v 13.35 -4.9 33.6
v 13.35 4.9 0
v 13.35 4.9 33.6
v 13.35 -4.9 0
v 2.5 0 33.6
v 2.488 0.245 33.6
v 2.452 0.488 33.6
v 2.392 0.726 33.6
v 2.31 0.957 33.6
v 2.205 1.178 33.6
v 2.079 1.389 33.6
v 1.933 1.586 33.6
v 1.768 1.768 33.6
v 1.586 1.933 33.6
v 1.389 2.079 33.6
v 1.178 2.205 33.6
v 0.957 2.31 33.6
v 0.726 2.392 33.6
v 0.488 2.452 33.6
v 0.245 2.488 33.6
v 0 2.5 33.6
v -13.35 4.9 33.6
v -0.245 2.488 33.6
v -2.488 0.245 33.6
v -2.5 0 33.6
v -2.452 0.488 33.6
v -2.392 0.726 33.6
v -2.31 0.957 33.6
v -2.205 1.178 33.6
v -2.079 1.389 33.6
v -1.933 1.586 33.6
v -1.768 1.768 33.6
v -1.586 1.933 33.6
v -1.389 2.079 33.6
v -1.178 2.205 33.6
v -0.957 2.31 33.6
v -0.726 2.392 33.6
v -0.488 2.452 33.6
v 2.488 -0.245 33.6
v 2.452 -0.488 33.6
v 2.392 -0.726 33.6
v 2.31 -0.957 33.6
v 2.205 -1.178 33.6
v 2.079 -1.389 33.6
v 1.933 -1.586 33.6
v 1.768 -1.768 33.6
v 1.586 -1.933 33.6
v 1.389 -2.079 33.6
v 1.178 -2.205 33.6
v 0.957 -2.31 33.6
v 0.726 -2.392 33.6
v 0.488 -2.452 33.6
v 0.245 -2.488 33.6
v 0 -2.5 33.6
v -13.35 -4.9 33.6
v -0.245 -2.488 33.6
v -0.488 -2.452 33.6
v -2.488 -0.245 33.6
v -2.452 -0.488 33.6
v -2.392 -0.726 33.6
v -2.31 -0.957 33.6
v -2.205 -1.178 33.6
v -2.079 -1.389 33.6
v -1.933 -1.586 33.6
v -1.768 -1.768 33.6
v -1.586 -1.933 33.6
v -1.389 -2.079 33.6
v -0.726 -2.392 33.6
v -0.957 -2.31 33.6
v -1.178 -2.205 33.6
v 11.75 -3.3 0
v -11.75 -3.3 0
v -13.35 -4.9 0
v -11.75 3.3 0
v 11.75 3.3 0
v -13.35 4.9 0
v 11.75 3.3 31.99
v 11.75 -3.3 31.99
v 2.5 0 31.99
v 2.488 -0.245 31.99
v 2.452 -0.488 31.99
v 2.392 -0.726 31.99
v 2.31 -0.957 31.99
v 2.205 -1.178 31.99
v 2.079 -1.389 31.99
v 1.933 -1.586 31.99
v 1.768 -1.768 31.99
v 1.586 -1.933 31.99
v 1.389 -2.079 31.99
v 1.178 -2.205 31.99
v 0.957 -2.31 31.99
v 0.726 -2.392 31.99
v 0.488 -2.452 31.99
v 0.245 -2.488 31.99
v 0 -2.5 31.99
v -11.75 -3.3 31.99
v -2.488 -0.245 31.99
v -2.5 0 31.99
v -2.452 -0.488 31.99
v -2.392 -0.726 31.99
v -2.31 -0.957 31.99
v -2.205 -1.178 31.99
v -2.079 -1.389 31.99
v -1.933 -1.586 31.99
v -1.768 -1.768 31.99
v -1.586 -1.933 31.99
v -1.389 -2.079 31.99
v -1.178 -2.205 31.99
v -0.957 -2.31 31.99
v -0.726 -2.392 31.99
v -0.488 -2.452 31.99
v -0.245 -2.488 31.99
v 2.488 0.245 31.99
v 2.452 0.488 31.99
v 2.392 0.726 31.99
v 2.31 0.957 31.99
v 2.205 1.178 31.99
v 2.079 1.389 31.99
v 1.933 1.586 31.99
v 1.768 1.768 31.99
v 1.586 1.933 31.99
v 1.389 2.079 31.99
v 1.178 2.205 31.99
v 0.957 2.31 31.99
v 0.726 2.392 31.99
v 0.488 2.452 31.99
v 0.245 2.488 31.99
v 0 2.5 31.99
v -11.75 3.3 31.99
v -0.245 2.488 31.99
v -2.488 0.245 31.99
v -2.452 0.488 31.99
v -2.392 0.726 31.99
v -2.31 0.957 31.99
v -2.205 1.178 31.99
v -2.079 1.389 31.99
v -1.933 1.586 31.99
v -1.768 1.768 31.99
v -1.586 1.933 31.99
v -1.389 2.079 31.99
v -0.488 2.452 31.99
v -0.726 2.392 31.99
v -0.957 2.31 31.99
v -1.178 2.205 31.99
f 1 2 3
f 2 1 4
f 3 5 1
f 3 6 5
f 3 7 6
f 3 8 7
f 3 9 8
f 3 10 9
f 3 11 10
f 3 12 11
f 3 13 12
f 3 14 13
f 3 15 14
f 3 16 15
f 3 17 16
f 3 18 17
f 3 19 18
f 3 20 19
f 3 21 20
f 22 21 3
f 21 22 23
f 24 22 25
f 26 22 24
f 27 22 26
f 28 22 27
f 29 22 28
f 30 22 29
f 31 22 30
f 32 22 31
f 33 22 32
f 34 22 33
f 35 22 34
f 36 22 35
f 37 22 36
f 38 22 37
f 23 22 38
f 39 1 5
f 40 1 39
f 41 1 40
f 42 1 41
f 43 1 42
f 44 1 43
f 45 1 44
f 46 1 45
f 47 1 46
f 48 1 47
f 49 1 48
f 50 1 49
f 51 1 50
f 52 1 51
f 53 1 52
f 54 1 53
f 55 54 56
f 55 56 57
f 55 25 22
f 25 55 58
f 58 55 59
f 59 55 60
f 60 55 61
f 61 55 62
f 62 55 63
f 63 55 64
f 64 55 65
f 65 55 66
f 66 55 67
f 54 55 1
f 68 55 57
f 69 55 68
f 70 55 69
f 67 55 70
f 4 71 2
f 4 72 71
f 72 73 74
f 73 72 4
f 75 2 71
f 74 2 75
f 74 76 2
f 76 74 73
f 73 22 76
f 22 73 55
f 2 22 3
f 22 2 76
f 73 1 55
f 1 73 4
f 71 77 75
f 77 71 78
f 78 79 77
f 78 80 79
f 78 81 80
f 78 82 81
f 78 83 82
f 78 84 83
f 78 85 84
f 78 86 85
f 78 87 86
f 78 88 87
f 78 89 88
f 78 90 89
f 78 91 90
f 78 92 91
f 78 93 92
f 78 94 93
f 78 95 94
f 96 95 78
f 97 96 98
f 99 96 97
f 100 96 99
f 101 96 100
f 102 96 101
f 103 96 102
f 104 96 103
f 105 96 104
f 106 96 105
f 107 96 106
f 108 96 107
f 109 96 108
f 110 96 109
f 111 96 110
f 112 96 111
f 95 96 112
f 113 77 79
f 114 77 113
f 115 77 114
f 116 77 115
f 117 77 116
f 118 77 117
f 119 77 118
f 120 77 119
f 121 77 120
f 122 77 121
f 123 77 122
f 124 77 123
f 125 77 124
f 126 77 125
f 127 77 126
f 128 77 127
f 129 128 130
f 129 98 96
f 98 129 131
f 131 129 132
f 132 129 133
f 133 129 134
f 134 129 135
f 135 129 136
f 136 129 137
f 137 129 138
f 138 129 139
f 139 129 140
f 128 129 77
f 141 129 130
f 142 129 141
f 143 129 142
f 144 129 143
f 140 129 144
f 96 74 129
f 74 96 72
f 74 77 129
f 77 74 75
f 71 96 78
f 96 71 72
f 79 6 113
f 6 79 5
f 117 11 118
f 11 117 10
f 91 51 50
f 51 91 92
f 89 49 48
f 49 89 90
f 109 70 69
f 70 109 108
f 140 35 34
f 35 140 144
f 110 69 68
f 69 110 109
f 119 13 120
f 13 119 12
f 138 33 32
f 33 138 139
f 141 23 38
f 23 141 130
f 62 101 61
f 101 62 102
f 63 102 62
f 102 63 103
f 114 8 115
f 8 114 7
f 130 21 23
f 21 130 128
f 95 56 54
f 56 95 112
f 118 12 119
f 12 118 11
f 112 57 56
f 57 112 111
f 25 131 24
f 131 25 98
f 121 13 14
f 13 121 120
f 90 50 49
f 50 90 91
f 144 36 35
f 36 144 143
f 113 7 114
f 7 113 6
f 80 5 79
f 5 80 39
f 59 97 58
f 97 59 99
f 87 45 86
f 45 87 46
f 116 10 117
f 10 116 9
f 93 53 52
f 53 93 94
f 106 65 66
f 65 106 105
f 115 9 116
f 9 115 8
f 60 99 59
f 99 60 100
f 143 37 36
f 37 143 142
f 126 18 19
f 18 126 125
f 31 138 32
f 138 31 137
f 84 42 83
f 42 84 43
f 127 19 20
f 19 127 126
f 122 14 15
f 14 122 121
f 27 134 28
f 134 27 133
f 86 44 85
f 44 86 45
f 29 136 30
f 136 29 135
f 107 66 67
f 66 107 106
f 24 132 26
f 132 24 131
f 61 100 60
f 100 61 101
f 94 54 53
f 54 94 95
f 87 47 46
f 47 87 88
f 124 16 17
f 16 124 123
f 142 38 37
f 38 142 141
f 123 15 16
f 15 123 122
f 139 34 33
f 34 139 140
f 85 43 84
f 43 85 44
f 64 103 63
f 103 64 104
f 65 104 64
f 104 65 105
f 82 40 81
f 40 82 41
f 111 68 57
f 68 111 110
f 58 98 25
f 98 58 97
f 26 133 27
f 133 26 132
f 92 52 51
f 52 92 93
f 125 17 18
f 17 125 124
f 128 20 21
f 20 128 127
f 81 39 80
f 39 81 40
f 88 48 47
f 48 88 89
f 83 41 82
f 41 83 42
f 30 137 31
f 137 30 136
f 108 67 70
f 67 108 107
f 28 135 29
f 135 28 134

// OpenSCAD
// file: comun.scad
// FieldShift · estación de campo · parámetros comunes (mm)
// Material: PETG o ASA (no PLA: se deforma al sol arriba de ~55 °C). Boquilla 0,4 mm, capas 0,2 mm.
$fn = 64;
tol      = 0.25;   // juego entre piezas que encastran (0,2–0,3 mm)
tol_eje  = 0.30;   // juego del eje del balancín (clavo o varilla de 2 mm)
pared    = 3.0;    // pared exterior (7–8 perímetros con 0,4 mm: estanca)
// inserto roscado M3 a calor (M3×5,7, Ø ext 4,6): agujero 4,0 × 6
ins_d = 4.0;  ins_h = 6.0;
m3_paso = 3.4;     // agujero pasante M3
m3_cab  = 6.2;     // cabeza M3 (avellanado plano)
m3_tuerca = 5.5 + 0.3; // tuerca M3 entre caras + juego
pg7_d   = 12.7;    // prensaestopas PG7: rosca 12,5 mm + juego
// tubo PVC: ½" SCH40 = 21,3 mm de diámetro exterior; ¾" = 26,7 mm
tubo_d  = 21.3;

module redondeado(l, a, h, r) {
  // prisma de l × a × h con esquinas verticales redondeadas de radio r
  hull() for (x = [r, l - r], y = [r, a - r]) translate([x, y, 0]) cylinder(r = r, h = h);
}
module inserto() { translate([0, 0, -0.01]) cylinder(d = ins_d, h = ins_h + 0.01); }
// main file
// Protector del sensor capacitivo de humedad (tipo v1.2/v2.0, placa de 98 × 23 × 1,6 mm):
//  - prot_tapa(): capuchón para la parte electrónica (los 30 mm de arriba). Se llena con silicona neutra o
//    resina epoxi; el cable sale por arriba con un pasacable. La electrónica sin proteger es lo primero
//    que falla en el campo (humedad, corrosión del 555 y del regulador).
//  - prot_punta(): funda en U de 12 mm para el filo inferior de la placa (cobre del corte expuesto) que además
//    abre camino al clavarlo. Va pegada; los bordes cortados se sellan antes con barniz de uñas o epoxi.
// La zona de medición (entre la punta y la línea blanca) NO se cubre: va en contacto directo con el suelo.
// Impresión: tapa de pie (abierta abajo) sin soportes; punta de pie sin soportes.
include <comun.scad>

pcb_a = 23.0; pcb_e = 1.6; comp = 4.5;   // ancho, espesor de la placa y alto de componentes
tapa_h = 32; tw = 1.6;
parte = "tapa"; // tapa | punta

module prot_tapa() {
  ai = pcb_a + 2 * tol;
  ei = pcb_e + comp + 2 * tol;
  difference() {
    translate([-ai / 2 - tw, -ei / 2 - tw, 0]) cube([ai + 2 * tw, ei + 2 * tw, tapa_h + tw]);
    translate([-ai / 2, -ei / 2, -0.01]) cube([ai, ei, tapa_h]);
    translate([0, 0, tapa_h - 1]) cylinder(d = 5, h = tw + 2);    // cable (Ø 4 + juego)
  }
}
module prot_punta() {
  h = 12;
  difference() {
    hull() {
      translate([-pcb_a / 2 - tw - tol, -pcb_e / 2 - tw - tol, 4]) cube([pcb_a + 2 * tw + 2 * tol, pcb_e + 2 * tw + 2 * tol, h - 4]);
      translate([-pcb_a / 4, -pcb_e / 2 - tw - tol, 0]) cube([pcb_a / 2, pcb_e + 2 * tw + 2 * tol, 1]);
    }
    translate([-pcb_a / 2 - tol, -pcb_e / 2 - tol, 3]) cube([pcb_a + 2 * tol, pcb_e + 2 * tol, h]);
  }
}
if (parte == "tapa") prot_tapa();
if (parte == "punta") prot_punta();

// para chequeo.scad: placa del sensor (con componentes) dentro de la tapa y de la punta
module pcb_tapa() translate([-pcb_a / 2, -(pcb_e + comp) / 2, -60]) cube([pcb_a, pcb_e + comp, 60 + tapa_h - 2]);
module pcb_punta() translate([-pcb_a / 2, -pcb_e / 2, 3.01]) cube([pcb_a, pcb_e, 80]);
